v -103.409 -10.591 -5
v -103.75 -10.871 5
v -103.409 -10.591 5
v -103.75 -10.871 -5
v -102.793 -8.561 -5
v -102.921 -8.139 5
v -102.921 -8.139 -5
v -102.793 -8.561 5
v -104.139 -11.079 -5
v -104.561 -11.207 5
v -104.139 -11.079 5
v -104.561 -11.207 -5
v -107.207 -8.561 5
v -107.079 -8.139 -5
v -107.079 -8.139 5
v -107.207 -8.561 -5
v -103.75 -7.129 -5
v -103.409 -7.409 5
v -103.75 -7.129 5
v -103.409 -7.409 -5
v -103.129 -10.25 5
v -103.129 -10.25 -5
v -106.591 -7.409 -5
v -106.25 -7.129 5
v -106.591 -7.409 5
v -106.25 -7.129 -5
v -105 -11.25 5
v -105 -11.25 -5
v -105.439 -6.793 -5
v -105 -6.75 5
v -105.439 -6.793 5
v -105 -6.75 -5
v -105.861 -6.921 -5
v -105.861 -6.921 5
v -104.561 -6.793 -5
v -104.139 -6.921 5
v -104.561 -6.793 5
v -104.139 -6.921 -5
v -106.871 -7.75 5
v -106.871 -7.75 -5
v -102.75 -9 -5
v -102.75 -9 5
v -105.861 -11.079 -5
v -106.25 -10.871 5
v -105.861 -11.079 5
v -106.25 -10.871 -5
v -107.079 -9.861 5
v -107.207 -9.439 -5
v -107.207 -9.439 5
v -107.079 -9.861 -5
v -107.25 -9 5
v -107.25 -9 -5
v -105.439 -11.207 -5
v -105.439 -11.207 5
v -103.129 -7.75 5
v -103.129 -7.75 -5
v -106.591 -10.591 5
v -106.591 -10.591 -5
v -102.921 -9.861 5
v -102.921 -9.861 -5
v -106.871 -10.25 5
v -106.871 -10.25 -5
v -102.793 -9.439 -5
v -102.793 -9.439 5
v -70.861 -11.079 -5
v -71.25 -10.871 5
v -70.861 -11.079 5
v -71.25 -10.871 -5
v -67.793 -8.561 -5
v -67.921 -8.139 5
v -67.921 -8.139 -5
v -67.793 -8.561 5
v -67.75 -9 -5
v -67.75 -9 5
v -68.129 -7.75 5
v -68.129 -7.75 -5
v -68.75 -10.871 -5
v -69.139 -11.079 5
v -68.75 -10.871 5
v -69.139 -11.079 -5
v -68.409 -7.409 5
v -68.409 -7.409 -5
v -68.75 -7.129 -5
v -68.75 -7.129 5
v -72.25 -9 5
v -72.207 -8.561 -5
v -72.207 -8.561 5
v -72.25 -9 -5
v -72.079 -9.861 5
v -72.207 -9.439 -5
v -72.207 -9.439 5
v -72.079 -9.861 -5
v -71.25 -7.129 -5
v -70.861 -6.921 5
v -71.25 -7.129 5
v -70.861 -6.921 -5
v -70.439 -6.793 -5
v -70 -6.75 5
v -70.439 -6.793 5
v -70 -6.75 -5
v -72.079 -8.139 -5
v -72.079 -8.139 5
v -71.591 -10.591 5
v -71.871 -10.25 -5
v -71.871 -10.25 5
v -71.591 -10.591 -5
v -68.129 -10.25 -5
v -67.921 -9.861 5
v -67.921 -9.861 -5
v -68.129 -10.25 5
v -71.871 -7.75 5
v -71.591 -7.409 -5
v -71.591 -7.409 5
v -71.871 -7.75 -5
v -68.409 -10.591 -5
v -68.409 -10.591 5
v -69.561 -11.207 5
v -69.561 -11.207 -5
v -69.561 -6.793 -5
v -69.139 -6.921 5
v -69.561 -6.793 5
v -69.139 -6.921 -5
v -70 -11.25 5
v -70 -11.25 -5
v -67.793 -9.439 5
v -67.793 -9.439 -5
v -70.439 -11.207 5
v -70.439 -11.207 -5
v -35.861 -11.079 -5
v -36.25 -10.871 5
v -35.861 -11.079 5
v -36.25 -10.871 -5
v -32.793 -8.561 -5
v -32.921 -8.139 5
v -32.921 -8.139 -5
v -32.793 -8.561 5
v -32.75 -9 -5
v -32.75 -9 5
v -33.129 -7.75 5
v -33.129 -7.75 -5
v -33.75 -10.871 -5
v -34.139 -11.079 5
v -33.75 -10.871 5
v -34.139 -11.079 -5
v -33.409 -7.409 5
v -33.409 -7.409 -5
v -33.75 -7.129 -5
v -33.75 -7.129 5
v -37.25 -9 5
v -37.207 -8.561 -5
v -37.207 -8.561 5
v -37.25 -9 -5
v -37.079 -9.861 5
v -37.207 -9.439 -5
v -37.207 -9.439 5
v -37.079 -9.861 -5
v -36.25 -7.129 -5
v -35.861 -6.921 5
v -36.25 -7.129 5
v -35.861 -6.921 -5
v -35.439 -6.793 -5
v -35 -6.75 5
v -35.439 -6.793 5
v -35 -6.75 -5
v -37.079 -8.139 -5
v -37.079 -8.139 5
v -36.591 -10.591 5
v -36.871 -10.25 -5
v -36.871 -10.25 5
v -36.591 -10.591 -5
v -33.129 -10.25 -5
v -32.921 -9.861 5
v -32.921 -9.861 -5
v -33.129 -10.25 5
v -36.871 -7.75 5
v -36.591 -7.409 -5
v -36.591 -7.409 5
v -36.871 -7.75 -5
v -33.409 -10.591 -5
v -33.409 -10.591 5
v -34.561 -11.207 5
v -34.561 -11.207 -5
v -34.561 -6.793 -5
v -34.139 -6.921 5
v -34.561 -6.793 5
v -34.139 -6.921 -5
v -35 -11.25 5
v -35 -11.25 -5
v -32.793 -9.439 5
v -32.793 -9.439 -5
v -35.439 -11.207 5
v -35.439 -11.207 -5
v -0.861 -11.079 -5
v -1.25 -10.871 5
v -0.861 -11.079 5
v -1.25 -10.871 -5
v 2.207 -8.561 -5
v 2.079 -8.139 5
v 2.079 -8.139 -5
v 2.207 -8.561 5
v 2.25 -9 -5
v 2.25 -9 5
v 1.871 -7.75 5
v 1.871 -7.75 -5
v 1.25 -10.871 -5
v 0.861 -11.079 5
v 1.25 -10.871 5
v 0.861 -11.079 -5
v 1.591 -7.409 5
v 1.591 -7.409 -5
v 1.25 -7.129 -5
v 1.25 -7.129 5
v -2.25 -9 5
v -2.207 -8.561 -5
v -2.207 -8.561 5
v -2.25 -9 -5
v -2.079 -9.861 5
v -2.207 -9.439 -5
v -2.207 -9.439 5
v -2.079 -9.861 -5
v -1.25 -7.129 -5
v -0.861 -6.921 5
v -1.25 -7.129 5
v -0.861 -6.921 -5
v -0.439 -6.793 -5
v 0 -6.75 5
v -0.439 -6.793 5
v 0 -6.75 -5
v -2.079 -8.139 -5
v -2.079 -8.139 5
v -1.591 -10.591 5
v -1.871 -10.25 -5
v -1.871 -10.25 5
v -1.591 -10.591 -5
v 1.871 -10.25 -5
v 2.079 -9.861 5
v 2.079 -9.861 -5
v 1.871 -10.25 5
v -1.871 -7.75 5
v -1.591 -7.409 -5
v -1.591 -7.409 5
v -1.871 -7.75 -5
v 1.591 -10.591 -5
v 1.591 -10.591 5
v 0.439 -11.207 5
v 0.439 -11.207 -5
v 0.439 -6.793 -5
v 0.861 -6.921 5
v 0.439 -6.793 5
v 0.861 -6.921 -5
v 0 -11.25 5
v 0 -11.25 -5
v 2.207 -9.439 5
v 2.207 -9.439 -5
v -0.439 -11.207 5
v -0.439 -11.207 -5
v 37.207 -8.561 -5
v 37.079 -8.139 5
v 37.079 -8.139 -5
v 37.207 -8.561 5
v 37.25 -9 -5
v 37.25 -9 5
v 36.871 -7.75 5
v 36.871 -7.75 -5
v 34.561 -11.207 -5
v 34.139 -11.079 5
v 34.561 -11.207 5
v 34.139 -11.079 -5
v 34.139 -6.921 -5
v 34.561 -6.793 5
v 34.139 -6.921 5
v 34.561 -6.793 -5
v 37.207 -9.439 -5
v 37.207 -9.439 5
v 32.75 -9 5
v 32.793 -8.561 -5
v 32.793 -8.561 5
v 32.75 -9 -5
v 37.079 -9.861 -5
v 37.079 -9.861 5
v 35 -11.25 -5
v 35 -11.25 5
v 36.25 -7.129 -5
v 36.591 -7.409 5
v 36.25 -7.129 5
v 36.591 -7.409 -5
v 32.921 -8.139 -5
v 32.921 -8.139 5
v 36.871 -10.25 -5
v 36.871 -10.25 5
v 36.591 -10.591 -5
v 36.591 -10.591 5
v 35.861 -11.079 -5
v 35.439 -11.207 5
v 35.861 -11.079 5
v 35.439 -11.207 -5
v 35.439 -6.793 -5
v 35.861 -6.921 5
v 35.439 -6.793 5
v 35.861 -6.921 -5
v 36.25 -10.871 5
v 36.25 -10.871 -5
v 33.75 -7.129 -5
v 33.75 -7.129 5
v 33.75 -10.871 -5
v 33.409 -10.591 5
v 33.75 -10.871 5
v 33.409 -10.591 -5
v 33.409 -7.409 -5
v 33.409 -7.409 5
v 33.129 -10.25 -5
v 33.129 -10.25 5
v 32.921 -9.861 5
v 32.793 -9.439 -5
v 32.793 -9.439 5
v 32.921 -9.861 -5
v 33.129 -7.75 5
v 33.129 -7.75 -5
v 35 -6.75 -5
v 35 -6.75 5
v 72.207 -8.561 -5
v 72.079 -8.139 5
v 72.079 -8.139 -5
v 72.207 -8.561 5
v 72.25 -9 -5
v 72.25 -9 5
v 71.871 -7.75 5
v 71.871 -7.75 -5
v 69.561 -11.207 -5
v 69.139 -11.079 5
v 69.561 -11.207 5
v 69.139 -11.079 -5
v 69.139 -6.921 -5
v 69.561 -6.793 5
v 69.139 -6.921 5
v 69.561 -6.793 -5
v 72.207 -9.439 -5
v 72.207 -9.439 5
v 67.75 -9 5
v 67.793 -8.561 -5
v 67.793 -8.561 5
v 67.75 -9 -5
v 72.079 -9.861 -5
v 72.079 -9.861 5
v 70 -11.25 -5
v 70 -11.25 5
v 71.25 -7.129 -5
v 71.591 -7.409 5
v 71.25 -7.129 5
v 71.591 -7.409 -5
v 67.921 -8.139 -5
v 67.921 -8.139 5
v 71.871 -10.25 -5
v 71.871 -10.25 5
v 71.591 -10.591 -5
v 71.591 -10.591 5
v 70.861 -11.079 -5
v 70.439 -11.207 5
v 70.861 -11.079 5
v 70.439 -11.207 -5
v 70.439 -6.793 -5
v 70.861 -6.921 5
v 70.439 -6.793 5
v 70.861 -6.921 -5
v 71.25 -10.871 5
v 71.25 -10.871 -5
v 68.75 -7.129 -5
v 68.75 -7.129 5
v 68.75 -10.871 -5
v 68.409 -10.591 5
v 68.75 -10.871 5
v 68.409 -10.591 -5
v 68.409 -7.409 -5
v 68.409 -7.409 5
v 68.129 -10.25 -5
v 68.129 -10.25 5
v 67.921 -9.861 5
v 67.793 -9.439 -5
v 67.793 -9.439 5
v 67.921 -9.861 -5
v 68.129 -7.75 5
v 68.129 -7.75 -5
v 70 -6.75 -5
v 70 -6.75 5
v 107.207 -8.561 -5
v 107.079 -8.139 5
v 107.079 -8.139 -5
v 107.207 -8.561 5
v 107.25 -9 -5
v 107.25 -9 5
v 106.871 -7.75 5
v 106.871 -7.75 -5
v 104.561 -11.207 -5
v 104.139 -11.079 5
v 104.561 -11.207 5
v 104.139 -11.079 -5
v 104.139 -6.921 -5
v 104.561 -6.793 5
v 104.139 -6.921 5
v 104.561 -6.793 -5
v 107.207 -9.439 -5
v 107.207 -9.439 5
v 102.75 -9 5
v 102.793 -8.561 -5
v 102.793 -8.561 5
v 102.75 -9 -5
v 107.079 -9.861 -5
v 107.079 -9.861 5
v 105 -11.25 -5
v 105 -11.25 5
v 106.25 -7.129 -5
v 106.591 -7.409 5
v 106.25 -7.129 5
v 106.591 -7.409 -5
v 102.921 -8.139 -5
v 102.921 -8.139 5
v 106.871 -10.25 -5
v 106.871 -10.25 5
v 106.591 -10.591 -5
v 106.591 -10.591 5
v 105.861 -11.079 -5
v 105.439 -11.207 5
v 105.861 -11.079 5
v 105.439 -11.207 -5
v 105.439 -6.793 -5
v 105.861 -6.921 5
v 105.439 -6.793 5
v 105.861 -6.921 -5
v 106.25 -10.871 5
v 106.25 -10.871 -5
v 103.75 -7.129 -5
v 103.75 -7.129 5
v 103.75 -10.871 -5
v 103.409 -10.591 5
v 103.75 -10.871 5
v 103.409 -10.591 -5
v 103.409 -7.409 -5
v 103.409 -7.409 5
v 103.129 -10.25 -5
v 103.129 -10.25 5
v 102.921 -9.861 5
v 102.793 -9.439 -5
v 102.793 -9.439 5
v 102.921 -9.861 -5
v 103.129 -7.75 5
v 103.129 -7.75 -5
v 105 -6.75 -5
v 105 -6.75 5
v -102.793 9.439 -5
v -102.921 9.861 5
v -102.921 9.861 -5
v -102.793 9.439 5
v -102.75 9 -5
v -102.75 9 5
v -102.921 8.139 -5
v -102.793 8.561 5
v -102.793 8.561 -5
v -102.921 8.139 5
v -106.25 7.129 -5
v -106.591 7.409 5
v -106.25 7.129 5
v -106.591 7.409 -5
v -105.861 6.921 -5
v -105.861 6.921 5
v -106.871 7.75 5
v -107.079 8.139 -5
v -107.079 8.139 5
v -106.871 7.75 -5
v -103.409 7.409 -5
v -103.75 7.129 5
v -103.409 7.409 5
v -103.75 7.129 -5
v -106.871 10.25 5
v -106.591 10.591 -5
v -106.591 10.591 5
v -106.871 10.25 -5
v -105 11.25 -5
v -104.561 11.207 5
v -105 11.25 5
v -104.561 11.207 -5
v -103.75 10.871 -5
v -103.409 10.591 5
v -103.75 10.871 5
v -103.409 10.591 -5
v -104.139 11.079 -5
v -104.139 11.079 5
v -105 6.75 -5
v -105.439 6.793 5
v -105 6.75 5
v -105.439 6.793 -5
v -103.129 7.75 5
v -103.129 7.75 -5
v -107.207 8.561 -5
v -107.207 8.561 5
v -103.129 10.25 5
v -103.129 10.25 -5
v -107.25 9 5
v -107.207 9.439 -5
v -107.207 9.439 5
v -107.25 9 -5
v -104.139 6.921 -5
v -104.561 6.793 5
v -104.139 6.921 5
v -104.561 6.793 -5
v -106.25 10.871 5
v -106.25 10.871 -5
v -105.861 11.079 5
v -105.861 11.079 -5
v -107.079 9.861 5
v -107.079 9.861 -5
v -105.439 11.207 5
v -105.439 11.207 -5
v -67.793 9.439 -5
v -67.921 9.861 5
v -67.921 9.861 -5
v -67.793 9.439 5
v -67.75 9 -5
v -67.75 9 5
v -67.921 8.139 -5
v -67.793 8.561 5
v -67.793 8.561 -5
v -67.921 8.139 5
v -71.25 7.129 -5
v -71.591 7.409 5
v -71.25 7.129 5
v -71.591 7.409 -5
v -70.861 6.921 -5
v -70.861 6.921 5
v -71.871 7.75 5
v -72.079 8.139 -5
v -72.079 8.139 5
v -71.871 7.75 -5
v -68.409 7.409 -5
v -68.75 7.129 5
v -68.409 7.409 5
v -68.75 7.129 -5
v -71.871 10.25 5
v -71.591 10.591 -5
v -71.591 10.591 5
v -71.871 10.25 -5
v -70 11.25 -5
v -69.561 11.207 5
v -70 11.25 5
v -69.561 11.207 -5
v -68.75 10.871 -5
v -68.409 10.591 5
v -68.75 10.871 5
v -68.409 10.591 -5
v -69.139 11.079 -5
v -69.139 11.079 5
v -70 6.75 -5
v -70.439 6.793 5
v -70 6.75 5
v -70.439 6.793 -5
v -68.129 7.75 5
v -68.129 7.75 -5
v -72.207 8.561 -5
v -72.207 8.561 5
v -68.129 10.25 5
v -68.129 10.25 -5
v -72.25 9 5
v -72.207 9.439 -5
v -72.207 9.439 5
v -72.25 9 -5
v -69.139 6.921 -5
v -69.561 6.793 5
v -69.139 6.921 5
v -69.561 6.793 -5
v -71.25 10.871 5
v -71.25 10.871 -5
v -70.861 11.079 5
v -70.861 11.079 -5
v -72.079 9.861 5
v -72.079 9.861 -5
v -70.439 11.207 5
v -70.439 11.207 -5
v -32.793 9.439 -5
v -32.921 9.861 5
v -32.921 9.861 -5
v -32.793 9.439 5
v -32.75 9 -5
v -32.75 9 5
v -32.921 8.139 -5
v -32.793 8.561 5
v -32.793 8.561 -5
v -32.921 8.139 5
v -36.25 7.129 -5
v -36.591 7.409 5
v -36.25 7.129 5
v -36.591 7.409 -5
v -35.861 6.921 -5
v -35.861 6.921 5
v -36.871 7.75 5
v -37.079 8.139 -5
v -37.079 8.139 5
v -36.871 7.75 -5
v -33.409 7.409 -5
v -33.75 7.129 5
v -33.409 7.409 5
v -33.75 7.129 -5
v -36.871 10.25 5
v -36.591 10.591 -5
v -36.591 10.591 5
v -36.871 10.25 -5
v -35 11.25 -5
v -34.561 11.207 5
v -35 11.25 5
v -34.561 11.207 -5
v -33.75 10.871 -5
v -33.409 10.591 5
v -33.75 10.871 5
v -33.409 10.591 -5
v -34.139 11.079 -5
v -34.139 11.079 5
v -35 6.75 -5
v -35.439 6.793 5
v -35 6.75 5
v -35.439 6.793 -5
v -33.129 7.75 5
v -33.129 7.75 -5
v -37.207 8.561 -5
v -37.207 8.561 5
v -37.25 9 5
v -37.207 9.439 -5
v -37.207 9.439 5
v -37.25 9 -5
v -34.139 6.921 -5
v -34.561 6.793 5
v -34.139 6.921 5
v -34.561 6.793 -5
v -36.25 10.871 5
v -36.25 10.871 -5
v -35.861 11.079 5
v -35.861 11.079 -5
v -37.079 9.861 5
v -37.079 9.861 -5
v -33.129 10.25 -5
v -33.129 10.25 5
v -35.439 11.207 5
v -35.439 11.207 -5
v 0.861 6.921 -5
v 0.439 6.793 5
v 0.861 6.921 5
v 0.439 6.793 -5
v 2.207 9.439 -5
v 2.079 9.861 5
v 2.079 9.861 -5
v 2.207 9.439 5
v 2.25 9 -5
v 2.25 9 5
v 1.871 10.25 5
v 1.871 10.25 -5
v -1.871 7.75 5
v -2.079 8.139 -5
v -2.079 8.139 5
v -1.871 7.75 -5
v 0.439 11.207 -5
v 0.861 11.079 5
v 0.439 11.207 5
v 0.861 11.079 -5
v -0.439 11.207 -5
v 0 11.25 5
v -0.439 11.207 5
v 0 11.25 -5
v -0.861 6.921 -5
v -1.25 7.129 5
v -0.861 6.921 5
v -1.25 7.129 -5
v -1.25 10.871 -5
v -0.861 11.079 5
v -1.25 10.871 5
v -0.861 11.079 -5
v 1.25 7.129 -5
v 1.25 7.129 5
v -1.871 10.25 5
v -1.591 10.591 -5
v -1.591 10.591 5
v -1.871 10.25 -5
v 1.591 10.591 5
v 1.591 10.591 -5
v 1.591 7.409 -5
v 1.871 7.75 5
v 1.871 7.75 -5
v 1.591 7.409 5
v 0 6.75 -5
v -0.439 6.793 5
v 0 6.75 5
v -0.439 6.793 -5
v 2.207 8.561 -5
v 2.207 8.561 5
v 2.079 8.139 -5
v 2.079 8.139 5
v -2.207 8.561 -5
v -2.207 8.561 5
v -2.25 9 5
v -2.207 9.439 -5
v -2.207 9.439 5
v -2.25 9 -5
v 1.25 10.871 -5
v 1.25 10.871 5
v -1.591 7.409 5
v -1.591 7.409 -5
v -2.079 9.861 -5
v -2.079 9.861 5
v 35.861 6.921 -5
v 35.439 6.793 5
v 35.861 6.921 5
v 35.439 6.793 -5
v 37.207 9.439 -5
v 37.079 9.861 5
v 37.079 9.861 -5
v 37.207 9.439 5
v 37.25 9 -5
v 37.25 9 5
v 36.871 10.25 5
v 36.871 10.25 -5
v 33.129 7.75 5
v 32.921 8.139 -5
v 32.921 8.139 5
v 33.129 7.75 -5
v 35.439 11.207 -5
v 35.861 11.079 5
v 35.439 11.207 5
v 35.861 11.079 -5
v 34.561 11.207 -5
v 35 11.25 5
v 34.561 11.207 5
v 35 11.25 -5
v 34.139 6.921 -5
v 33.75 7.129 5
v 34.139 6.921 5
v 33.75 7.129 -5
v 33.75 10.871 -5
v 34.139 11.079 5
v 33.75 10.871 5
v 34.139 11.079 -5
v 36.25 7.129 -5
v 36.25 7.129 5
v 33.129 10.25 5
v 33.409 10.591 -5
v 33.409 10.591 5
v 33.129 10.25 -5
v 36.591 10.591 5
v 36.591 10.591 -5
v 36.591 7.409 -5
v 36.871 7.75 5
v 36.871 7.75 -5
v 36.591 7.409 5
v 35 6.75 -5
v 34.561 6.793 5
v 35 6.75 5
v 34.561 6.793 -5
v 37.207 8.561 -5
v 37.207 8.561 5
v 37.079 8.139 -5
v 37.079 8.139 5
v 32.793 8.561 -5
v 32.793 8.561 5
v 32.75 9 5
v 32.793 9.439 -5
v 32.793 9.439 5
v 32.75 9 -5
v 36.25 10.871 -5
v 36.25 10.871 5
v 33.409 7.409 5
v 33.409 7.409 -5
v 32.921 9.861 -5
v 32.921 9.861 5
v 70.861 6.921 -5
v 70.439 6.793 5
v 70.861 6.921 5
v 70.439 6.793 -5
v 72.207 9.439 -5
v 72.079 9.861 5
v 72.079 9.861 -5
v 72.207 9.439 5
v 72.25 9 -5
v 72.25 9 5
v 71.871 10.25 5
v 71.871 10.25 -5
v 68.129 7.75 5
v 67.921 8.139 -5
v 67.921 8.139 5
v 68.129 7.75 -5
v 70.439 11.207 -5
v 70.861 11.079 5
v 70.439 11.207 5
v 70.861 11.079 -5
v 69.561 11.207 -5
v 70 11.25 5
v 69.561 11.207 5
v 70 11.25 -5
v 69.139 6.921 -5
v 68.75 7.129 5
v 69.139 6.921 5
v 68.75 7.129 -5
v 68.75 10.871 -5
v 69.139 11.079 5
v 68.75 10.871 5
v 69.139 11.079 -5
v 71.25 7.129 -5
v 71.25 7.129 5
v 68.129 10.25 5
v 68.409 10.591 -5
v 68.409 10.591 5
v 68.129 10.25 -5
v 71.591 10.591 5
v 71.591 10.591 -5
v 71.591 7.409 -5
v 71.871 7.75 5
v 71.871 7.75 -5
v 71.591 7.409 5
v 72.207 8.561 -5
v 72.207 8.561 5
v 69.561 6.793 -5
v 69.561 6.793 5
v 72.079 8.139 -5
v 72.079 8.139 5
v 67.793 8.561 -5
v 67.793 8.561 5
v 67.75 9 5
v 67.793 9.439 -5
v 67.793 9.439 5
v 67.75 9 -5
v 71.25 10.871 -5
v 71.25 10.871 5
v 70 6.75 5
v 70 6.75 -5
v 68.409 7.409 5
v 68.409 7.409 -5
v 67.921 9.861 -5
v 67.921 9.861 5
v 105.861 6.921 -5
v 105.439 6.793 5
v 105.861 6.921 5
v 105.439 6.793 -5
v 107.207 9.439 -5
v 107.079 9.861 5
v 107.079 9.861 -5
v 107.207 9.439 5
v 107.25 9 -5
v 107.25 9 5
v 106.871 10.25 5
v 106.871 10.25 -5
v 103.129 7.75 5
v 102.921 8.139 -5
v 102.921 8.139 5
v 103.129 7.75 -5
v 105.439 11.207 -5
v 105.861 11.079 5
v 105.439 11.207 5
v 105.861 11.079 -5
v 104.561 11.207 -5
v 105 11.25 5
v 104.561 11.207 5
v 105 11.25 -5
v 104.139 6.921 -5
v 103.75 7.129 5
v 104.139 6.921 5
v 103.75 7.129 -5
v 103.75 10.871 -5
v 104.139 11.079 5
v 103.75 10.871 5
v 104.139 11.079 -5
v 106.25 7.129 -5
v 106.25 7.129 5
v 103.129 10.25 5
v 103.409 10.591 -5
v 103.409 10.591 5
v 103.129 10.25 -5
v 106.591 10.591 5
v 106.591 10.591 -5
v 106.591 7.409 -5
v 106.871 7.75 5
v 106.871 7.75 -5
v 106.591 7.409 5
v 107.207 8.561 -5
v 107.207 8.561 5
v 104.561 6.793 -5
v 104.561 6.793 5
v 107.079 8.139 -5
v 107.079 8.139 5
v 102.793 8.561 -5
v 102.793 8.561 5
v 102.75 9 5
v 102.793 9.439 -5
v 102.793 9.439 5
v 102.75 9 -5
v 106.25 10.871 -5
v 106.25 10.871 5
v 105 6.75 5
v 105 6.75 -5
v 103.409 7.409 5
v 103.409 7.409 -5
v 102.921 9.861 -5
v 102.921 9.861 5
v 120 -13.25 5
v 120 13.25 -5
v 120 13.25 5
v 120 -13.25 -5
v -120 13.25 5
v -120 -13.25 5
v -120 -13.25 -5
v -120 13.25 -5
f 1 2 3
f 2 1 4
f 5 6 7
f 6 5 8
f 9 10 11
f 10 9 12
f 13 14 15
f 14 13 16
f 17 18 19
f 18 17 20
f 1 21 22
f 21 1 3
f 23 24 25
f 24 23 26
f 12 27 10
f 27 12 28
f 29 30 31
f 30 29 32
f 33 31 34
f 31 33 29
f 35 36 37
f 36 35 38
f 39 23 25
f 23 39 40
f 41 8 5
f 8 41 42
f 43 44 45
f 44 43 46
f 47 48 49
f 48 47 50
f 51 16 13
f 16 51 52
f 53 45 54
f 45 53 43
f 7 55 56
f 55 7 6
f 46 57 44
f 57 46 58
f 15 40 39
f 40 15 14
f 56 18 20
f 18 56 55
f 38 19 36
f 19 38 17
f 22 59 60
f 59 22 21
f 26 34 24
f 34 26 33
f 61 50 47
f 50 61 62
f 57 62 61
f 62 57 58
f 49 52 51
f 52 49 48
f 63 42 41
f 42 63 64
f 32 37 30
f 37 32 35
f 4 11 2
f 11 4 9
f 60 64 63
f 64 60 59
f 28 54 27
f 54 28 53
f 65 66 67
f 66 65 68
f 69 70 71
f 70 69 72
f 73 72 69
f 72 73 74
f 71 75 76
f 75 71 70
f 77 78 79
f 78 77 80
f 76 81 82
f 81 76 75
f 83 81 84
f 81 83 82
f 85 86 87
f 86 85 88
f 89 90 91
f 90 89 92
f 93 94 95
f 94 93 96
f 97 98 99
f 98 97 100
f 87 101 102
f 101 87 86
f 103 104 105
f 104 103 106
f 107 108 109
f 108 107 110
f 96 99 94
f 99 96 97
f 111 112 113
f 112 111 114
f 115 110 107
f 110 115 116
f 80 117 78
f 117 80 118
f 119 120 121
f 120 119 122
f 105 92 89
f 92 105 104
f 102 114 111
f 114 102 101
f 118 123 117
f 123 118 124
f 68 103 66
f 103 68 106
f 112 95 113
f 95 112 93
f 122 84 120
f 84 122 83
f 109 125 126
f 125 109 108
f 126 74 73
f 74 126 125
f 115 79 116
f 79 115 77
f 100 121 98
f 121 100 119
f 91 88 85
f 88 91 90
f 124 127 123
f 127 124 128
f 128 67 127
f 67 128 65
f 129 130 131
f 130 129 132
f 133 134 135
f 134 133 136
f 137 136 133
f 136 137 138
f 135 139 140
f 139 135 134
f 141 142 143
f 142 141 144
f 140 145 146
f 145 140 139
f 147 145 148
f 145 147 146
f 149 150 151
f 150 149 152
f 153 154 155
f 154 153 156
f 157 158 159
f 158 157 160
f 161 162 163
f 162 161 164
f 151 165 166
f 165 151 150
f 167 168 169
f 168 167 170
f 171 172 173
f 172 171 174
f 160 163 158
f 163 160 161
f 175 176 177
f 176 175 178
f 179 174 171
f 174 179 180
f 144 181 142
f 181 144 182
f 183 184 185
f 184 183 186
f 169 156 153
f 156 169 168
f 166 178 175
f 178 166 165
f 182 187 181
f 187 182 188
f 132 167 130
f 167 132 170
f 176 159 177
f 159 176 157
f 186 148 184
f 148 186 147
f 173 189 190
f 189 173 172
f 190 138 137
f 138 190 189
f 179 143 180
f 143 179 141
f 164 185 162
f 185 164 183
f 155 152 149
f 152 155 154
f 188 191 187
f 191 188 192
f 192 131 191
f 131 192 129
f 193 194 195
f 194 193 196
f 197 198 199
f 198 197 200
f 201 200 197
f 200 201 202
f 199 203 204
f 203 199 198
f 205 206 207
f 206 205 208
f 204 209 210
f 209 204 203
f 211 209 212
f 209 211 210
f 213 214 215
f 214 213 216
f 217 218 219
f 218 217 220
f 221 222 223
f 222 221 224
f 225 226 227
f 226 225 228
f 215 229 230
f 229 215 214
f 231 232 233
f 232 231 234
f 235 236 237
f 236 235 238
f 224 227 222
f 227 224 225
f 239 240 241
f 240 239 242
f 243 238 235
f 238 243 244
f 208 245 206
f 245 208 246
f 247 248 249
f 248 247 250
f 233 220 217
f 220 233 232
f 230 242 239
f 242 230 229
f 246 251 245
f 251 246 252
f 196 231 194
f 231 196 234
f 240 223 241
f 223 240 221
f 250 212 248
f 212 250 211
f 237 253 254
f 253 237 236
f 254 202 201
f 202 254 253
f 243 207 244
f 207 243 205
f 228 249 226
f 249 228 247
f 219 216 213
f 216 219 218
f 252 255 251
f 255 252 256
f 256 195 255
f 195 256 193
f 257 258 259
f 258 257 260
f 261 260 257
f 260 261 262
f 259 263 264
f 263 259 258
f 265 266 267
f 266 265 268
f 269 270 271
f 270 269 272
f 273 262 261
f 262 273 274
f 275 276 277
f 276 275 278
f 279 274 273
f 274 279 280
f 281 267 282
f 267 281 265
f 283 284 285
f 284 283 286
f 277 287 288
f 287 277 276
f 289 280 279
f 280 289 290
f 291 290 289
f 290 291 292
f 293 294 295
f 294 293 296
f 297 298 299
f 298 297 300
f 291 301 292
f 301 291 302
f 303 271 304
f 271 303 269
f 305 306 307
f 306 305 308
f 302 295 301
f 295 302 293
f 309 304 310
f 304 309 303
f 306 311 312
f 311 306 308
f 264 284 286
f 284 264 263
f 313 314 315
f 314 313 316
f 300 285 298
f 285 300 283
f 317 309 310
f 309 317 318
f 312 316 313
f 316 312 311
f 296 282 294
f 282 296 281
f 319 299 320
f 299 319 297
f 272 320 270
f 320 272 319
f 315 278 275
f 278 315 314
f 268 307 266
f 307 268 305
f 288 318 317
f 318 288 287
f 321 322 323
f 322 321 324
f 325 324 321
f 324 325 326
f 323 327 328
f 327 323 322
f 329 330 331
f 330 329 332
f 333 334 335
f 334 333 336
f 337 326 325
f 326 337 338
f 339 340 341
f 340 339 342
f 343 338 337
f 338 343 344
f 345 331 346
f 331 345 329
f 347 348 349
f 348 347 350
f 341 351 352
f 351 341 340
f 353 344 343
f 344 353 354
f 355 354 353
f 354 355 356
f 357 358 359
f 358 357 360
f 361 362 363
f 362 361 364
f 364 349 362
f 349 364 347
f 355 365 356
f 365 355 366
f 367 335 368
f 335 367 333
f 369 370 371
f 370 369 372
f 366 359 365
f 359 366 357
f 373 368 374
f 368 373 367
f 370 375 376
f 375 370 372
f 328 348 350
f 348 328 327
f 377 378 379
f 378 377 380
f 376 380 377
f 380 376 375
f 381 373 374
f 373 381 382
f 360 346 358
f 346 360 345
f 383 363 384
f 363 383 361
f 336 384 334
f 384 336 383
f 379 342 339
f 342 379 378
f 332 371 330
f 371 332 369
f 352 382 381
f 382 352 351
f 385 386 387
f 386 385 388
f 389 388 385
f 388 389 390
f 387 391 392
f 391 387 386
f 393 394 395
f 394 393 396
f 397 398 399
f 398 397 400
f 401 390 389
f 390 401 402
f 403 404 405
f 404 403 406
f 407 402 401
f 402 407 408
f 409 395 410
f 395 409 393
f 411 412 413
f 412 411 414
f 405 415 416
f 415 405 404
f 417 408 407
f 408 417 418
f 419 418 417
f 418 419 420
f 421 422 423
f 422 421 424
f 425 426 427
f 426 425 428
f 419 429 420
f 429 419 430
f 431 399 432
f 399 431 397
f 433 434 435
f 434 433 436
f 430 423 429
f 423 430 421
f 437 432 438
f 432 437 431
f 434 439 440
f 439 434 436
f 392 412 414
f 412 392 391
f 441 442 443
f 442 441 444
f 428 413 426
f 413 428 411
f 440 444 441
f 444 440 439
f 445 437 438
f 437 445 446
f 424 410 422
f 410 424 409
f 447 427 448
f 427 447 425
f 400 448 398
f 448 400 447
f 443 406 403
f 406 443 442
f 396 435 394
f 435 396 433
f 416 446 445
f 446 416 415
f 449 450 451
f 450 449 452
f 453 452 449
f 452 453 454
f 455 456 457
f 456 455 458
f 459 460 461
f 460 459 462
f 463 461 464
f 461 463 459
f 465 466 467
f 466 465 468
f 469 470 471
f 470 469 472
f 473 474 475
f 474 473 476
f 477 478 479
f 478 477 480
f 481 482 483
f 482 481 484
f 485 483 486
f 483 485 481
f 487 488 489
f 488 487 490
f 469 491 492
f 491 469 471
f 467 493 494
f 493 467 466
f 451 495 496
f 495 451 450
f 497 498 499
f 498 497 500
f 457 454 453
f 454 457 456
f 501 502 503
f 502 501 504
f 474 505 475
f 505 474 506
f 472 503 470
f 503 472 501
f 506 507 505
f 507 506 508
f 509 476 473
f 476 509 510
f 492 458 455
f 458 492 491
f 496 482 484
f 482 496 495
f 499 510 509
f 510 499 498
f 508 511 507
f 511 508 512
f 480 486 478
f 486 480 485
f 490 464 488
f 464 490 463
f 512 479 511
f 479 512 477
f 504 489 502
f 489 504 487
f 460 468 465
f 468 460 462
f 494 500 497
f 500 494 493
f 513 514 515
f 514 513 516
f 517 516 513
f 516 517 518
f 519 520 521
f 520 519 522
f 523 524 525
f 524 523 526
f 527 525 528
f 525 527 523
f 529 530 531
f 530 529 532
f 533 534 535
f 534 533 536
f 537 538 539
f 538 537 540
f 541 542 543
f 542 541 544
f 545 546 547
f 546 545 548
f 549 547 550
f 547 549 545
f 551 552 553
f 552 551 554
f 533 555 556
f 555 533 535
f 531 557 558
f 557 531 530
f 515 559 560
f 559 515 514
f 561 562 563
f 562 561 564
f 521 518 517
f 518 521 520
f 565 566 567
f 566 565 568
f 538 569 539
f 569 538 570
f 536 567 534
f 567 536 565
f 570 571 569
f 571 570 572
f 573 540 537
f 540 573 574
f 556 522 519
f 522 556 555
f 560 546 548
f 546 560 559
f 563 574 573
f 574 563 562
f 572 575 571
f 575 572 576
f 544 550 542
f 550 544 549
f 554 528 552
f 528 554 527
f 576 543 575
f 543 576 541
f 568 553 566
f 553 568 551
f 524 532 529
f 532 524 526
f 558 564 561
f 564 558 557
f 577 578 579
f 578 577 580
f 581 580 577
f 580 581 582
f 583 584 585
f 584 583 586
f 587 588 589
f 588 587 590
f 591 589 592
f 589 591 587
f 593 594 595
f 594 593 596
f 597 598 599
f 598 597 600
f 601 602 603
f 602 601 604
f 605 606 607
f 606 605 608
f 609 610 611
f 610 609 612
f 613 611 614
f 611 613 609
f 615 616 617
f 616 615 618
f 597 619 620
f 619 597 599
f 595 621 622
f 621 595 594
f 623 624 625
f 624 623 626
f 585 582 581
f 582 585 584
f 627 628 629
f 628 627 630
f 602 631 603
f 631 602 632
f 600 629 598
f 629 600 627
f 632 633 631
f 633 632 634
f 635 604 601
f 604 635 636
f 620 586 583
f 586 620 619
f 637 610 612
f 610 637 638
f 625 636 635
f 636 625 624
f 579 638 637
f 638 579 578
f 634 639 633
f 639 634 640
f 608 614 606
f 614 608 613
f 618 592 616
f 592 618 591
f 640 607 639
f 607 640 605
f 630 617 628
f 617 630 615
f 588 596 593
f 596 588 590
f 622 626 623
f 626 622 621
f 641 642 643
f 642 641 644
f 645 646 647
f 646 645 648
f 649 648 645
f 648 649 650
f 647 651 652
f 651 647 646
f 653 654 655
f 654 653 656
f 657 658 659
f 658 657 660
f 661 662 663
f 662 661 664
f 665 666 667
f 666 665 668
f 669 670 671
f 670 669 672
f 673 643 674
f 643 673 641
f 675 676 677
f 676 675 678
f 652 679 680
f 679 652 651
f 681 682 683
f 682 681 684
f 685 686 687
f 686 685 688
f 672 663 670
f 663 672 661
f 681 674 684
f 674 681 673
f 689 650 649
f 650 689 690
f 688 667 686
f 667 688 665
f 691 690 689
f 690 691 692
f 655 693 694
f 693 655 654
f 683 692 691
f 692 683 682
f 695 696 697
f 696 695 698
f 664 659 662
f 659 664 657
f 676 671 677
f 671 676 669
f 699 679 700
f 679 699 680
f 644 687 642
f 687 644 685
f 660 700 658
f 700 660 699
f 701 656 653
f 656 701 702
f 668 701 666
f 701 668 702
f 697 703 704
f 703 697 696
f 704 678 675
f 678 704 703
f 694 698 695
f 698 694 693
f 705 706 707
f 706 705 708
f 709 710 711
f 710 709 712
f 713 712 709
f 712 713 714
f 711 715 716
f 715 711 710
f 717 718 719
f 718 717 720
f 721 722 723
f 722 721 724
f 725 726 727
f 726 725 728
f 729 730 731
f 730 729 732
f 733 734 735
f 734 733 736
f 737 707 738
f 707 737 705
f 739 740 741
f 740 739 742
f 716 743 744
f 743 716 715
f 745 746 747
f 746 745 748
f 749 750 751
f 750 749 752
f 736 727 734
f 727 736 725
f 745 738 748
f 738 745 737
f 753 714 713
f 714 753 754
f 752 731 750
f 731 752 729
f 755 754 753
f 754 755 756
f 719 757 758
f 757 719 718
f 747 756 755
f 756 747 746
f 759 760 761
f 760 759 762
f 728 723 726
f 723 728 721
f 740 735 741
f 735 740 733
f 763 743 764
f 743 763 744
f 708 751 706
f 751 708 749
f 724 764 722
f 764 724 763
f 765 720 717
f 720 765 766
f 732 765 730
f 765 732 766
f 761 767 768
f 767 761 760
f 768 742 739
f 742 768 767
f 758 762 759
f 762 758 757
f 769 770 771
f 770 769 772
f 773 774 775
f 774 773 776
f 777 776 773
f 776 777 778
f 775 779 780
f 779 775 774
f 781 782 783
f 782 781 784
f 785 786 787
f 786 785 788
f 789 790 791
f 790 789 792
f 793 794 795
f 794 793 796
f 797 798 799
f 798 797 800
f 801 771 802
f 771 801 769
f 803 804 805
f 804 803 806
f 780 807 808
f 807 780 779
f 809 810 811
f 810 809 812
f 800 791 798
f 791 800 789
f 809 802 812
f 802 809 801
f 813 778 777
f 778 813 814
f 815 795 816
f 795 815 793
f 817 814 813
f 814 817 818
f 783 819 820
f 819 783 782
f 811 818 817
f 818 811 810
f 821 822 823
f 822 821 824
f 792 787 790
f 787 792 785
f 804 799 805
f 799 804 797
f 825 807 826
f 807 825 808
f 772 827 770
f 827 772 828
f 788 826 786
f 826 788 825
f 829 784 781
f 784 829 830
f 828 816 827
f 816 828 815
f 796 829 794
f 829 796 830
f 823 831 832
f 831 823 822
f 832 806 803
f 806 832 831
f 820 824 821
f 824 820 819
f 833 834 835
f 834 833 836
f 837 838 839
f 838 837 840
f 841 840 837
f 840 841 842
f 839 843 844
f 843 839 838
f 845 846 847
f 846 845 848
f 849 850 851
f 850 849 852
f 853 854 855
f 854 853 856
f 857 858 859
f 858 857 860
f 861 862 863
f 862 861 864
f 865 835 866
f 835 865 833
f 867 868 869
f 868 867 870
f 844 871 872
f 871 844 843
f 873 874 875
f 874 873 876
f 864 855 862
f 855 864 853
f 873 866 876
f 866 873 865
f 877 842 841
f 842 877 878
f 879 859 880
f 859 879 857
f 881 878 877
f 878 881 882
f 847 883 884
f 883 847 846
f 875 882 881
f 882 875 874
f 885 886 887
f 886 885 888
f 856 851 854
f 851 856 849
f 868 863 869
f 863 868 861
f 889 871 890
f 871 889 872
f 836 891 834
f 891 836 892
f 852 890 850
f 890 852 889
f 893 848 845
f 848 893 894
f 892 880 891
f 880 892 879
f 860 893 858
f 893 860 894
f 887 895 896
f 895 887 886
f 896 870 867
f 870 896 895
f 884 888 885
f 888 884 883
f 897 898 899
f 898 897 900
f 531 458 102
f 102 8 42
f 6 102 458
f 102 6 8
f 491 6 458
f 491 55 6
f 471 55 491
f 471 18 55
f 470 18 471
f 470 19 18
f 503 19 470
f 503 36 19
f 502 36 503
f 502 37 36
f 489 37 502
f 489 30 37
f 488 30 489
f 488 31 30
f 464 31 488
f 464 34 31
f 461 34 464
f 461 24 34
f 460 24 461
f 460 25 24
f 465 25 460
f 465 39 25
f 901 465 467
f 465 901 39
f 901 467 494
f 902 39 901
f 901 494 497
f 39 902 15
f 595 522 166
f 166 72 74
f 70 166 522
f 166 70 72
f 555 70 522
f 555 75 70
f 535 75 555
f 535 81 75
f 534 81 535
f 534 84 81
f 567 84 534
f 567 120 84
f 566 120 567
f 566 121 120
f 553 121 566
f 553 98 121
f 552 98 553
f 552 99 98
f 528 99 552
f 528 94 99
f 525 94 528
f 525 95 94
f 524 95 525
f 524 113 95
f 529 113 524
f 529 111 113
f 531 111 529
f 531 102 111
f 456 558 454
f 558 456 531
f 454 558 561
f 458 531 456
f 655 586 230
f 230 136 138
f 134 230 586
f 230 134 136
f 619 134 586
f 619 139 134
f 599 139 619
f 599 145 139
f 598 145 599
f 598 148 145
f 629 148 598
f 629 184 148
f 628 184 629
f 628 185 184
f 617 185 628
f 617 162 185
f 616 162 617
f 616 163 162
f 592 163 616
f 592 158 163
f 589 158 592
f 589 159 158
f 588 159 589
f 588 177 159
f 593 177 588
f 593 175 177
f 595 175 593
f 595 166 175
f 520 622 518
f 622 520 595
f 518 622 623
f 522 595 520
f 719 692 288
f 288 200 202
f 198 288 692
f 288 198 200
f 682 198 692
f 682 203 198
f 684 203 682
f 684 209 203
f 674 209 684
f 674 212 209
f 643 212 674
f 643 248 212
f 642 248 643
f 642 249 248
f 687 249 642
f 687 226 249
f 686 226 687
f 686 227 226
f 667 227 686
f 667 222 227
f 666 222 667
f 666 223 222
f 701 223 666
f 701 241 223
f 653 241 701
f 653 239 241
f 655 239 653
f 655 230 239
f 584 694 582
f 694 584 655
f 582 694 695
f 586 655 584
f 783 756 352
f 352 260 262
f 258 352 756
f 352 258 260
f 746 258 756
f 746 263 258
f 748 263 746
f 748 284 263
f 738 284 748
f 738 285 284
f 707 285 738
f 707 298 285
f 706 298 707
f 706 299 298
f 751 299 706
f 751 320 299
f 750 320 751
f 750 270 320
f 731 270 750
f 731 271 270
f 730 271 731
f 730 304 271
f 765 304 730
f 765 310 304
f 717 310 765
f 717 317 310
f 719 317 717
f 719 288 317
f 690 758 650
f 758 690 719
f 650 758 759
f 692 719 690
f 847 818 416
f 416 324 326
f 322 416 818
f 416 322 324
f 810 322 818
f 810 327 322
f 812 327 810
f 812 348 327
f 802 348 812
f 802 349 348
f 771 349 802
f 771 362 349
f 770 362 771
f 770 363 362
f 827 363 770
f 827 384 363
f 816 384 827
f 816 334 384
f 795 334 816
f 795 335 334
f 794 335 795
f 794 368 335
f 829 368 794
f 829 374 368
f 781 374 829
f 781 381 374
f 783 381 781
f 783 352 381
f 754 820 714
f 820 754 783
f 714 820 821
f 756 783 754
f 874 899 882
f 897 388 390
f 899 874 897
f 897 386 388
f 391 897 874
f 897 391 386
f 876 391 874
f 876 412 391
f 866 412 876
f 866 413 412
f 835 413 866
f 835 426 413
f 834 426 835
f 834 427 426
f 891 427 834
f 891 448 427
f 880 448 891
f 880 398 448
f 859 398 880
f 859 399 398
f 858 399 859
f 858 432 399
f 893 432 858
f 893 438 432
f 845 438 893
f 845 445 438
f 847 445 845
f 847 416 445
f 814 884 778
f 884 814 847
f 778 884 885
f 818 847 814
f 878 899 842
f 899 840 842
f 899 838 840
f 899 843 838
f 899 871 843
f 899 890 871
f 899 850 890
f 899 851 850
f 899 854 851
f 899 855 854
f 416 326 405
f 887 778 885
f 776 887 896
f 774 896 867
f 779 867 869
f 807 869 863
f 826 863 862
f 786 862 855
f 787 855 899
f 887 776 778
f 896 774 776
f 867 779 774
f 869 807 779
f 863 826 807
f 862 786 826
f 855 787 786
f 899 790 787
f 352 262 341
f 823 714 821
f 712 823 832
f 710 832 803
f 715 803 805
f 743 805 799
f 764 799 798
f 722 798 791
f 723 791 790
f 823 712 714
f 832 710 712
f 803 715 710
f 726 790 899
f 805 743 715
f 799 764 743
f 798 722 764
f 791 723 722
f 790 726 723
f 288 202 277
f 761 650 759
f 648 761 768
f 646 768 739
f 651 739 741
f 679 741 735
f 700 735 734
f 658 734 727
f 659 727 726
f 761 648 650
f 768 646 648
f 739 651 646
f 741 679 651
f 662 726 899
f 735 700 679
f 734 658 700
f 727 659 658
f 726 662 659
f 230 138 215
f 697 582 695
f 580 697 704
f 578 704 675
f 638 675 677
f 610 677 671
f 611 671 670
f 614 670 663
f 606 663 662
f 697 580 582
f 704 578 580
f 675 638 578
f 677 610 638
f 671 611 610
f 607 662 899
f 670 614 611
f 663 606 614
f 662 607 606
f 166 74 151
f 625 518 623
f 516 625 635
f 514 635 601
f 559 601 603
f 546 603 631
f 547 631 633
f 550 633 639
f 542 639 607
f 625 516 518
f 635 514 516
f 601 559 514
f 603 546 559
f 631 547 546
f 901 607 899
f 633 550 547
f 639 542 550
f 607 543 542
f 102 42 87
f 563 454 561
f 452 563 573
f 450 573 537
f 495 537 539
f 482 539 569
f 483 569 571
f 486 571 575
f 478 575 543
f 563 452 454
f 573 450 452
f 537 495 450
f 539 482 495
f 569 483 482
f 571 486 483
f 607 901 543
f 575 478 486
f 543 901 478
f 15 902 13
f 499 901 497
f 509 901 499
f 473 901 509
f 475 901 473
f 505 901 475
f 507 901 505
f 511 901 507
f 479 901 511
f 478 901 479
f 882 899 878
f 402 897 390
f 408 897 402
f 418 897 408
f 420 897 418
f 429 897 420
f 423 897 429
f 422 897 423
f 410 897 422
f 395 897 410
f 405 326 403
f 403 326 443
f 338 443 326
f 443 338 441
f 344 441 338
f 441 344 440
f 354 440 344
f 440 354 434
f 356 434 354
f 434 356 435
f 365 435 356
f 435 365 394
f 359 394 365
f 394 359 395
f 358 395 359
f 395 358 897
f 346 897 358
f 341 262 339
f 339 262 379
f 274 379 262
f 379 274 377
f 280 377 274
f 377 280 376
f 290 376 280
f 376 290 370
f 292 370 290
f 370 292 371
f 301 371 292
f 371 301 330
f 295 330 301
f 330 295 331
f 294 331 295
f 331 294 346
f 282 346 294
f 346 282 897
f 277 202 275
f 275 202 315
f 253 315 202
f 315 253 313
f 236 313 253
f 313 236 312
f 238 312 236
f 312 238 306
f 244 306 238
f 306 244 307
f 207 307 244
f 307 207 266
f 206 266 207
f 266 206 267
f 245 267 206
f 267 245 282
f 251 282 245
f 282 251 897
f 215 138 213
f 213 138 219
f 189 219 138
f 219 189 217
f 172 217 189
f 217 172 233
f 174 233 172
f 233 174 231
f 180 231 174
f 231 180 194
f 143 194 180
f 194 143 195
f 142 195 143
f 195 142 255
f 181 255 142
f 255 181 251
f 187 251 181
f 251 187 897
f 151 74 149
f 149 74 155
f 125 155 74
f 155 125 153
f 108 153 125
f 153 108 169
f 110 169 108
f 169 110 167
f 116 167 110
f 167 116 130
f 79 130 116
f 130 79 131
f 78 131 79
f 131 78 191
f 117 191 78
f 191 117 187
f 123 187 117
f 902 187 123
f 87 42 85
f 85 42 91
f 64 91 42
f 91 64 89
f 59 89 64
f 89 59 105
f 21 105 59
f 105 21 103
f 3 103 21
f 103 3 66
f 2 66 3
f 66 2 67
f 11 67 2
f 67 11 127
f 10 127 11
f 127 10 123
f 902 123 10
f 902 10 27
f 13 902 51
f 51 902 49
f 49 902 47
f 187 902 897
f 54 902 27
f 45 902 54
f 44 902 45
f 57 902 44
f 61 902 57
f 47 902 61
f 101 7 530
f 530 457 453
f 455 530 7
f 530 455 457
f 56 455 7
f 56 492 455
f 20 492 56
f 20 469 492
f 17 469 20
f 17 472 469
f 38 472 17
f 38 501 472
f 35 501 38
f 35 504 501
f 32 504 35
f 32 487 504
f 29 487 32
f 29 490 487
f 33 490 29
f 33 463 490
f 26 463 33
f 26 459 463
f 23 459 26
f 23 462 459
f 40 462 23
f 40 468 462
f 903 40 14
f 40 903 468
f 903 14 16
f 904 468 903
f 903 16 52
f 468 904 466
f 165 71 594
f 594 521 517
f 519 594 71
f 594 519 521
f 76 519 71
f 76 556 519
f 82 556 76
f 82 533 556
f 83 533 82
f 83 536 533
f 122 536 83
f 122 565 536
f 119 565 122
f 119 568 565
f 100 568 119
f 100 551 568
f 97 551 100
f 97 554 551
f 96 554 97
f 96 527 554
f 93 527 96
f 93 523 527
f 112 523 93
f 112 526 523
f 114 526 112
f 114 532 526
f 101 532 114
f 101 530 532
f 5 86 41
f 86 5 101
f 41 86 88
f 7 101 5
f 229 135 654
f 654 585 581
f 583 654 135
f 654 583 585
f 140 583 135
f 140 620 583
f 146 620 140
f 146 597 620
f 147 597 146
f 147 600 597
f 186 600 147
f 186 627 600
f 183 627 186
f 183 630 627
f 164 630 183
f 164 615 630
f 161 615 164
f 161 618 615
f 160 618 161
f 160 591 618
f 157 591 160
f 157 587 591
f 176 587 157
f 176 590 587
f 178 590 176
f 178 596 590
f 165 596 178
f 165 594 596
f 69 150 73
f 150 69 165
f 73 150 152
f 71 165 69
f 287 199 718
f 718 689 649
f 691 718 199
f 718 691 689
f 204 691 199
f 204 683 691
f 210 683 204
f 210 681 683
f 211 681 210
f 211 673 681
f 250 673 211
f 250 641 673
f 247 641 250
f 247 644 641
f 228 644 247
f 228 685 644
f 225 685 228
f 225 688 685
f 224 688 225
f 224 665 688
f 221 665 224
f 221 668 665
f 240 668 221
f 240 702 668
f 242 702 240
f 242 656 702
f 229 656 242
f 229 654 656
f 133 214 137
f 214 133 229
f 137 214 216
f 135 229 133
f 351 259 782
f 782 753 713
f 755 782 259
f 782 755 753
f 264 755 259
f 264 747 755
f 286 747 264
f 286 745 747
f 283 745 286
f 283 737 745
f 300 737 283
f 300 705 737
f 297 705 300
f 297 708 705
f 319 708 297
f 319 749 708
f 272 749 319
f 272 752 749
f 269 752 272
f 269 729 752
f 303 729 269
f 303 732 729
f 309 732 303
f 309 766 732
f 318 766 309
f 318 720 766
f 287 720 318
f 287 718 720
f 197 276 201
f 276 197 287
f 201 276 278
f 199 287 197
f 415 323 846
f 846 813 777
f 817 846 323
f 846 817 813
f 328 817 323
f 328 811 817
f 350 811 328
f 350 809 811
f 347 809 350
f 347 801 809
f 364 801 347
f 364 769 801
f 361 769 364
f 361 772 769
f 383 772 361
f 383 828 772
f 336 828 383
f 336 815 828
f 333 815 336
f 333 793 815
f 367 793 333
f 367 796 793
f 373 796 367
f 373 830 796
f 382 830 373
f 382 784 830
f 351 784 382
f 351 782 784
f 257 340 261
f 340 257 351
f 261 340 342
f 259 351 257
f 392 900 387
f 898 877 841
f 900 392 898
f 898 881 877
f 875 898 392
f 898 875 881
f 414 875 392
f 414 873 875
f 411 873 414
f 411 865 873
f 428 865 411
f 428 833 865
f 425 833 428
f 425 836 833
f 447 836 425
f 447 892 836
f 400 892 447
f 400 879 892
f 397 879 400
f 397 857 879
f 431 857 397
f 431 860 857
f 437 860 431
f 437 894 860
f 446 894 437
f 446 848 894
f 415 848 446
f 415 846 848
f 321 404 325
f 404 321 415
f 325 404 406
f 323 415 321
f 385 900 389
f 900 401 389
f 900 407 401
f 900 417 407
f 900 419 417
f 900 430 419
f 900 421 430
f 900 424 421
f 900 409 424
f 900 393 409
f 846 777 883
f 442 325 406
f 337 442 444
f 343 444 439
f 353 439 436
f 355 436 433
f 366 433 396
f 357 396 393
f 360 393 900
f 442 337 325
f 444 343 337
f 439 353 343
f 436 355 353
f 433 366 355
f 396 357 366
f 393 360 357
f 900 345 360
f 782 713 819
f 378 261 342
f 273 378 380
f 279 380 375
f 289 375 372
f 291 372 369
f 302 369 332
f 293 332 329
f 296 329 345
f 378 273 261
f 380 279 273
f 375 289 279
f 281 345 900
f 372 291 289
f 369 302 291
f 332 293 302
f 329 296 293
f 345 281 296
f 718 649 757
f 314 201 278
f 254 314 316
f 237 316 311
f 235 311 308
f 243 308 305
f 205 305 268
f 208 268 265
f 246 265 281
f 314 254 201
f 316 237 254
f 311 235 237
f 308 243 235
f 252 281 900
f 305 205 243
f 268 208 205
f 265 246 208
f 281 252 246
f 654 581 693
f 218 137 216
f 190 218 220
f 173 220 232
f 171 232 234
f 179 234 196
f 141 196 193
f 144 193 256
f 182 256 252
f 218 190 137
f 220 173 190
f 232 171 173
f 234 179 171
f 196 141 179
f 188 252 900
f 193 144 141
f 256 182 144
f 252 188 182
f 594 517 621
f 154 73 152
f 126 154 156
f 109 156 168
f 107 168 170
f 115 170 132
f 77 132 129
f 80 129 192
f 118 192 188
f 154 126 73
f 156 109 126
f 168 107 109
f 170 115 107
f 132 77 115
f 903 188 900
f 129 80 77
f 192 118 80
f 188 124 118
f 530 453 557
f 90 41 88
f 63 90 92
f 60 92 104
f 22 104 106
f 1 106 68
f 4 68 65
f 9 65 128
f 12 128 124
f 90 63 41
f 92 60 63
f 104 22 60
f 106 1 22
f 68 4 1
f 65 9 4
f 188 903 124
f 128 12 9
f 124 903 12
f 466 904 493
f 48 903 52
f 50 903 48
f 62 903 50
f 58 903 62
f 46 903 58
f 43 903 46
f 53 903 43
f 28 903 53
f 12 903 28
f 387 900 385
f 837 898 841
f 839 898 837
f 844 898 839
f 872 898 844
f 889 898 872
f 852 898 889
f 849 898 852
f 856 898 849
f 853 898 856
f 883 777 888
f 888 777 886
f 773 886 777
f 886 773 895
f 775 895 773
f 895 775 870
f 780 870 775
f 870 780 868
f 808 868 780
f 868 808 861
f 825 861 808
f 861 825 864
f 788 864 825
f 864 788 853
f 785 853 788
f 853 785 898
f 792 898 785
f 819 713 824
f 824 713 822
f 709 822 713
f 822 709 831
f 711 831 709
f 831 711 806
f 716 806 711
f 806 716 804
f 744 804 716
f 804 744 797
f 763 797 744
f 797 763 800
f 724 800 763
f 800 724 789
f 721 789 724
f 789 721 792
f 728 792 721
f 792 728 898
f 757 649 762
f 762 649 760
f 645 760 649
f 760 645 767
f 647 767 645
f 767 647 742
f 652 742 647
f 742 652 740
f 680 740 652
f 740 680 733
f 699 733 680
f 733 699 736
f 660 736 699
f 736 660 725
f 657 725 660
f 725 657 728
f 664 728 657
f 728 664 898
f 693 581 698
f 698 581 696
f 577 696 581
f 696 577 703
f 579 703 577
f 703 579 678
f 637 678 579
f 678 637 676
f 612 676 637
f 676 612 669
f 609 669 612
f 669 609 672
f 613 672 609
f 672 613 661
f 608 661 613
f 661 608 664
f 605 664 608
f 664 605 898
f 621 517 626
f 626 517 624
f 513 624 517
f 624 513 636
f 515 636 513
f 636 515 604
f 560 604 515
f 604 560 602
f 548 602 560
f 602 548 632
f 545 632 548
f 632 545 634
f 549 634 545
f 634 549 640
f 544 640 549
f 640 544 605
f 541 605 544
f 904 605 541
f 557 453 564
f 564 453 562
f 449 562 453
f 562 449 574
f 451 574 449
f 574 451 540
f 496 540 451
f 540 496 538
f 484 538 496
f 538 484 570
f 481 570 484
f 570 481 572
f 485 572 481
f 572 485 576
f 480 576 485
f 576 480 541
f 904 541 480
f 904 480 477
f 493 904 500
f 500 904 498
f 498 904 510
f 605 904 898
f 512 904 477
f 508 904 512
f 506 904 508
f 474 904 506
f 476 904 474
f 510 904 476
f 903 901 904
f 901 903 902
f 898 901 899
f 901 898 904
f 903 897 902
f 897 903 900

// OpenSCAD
$fn = 32;

// ----------------------------------------------------------------------
// Hole bar, 7 x Ø4.5
// tworows layout, 15 mm edge offset
// ----------------------------------------------------------------------

// --- parameters (mm) ---
bar_w = 26.5;     // bar width (Y)
bar_t = 10;       // bar thickness (Z)
holes = 7;        // holes per row
hole_d = 4.5;     // hole diameter
edge = 15;        // offset from the bar end to the first hole
pitch = 35;       // pitch between neighbouring holes
row_offset = 18;  // distance between the two rows

// --- derived feature positions (mm) ---
span = (holes - 1) * pitch;   // = 210   distance between the end holes
bar_l = span + 2 * edge;      // = 240   overall bar length
start_x = -bar_l / 2 + edge;  // = -105   X of the first hole
feature_centers = [
  [start_x + 0 * pitch, -row_offset / 2],
  [start_x + 1 * pitch, -row_offset / 2],
  [start_x + 2 * pitch, -row_offset / 2],
  [start_x + 3 * pitch, -row_offset / 2],
  [start_x + 4 * pitch, -row_offset / 2],
  [start_x + 5 * pitch, -row_offset / 2],
  [start_x + 6 * pitch, -row_offset / 2]
];   // hole centres of the first row
row2_centers = [
  [start_x + 0 * pitch, row_offset / 2],
  [start_x + 1 * pitch, row_offset / 2],
  [start_x + 2 * pitch, row_offset / 2],
  [start_x + 3 * pitch, row_offset / 2],
  [start_x + 4 * pitch, row_offset / 2],
  [start_x + 5 * pitch, row_offset / 2],
  [start_x + 6 * pitch, row_offset / 2]
];   // hole centres of the second row

// bar with two rows of holes, both read from their own centre arrays
difference() {
  translate([-bar_l / 2, -bar_w / 2, -bar_t / 2]) cube([bar_l, bar_w, bar_t]);
  for (centre = feature_centers)
    translate([centre[0], centre[1], 0])
      cylinder(d = hole_d, h = bar_t + 2, center = true);
  for (centre = row2_centers)
    translate([centre[0], centre[1], 0])
      cylinder(d = hole_d, h = bar_t + 2, center = true);
}
